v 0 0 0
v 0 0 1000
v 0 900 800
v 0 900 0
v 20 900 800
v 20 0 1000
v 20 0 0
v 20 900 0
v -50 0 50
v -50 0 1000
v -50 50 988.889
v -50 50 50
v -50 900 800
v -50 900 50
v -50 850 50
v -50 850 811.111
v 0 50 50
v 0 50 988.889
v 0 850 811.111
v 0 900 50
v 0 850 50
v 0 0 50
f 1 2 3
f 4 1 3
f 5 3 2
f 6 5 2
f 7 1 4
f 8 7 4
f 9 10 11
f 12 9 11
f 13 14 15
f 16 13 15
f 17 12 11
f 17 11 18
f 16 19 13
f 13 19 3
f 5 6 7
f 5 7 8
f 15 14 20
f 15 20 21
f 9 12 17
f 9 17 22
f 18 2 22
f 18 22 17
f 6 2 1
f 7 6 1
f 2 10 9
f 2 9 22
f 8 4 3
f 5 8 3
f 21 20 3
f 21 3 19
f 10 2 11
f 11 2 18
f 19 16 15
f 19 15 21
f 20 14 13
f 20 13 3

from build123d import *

# Parameters (mm, degrees)
F1_DEPTH  = 20
F2_W      = 50
F2_H      = 50
F3_DEPTH  = 1000
F5_DEPTH  = 153
F6_W      = 50
F6_H      = 50
F7_DEPTH  = 112
F8_W      = 50
F8_H      = 50
F9_DEPTH  = 850
F11_DEPTH = 169
F12_W     = 50
F12_H     = 50
F13_DEPTH = 94


with BuildPart() as f1:
    # F0 (on Right) → F1 (new body)
    with BuildSketch(Plane.YZ):
        Polygon((0, 1000), (0, 0), (900, 0), (900, 800), align=None)
    extrude(amount=F1_DEPTH)


with BuildPart() as f3:
    # F2 (on Top) → F3 (new body)
    with BuildSketch(Plane.XY):
        with Locations((-25, 25)):
            Rectangle(F2_W, F2_H)
    extrude(amount=F3_DEPTH)

    # F4 (on face) → F5 (cut)
    with BuildSketch(Plane.YZ.offset(20)):
        Polygon((0, 1058.948), (0, 1000), (140.4614215388, 968.7863507692), (140.4614215388, 1058.948), align=None)
    extrude(amount=-F5_DEPTH, mode=Mode.SUBTRACT)

    # F6 (on face) → F7 (cut)
    with BuildSketch(Plane(origin=(-50, 0, 0), x_dir=(0, -1, 0), z_dir=(-1, 0, 0))):
        with Locations((-25, 25)):
            Rectangle(F6_W, F6_H)
    extrude(amount=-F7_DEPTH, mode=Mode.SUBTRACT)


with BuildPart() as f9:
    # F8 (on face) → F9 (new body)
    with BuildSketch(Plane(origin=(0, 0, 0), x_dir=(1, 0, 0), z_dir=(0, 0, -1))):
        with Locations((-25, -875)):
            Rectangle(F8_W, F8_H)
    extrude(amount=-F9_DEPTH)

    # F10 (on face) → F11 (cut)
    with BuildSketch(Plane.YZ.offset(20)):
        Polygon((787.202956396, 899.949669838), (787.202956396, 825.0660096898), (900, 800), (900, 899.949669838), align=None)
    extrude(amount=-F11_DEPTH, mode=Mode.SUBTRACT)

    # F12 (on face) → F13 (cut)
    with BuildSketch(Plane(origin=(-50, 0, 0), x_dir=(0, -1, 0), z_dir=(-1, 0, 0))):
        with Locations((-875, 25)):
            Rectangle(F12_W, F12_H)
    extrude(amount=-F13_DEPTH, mode=Mode.SUBTRACT)


solid = Compound([f1.part, f3.part, f9.part])
